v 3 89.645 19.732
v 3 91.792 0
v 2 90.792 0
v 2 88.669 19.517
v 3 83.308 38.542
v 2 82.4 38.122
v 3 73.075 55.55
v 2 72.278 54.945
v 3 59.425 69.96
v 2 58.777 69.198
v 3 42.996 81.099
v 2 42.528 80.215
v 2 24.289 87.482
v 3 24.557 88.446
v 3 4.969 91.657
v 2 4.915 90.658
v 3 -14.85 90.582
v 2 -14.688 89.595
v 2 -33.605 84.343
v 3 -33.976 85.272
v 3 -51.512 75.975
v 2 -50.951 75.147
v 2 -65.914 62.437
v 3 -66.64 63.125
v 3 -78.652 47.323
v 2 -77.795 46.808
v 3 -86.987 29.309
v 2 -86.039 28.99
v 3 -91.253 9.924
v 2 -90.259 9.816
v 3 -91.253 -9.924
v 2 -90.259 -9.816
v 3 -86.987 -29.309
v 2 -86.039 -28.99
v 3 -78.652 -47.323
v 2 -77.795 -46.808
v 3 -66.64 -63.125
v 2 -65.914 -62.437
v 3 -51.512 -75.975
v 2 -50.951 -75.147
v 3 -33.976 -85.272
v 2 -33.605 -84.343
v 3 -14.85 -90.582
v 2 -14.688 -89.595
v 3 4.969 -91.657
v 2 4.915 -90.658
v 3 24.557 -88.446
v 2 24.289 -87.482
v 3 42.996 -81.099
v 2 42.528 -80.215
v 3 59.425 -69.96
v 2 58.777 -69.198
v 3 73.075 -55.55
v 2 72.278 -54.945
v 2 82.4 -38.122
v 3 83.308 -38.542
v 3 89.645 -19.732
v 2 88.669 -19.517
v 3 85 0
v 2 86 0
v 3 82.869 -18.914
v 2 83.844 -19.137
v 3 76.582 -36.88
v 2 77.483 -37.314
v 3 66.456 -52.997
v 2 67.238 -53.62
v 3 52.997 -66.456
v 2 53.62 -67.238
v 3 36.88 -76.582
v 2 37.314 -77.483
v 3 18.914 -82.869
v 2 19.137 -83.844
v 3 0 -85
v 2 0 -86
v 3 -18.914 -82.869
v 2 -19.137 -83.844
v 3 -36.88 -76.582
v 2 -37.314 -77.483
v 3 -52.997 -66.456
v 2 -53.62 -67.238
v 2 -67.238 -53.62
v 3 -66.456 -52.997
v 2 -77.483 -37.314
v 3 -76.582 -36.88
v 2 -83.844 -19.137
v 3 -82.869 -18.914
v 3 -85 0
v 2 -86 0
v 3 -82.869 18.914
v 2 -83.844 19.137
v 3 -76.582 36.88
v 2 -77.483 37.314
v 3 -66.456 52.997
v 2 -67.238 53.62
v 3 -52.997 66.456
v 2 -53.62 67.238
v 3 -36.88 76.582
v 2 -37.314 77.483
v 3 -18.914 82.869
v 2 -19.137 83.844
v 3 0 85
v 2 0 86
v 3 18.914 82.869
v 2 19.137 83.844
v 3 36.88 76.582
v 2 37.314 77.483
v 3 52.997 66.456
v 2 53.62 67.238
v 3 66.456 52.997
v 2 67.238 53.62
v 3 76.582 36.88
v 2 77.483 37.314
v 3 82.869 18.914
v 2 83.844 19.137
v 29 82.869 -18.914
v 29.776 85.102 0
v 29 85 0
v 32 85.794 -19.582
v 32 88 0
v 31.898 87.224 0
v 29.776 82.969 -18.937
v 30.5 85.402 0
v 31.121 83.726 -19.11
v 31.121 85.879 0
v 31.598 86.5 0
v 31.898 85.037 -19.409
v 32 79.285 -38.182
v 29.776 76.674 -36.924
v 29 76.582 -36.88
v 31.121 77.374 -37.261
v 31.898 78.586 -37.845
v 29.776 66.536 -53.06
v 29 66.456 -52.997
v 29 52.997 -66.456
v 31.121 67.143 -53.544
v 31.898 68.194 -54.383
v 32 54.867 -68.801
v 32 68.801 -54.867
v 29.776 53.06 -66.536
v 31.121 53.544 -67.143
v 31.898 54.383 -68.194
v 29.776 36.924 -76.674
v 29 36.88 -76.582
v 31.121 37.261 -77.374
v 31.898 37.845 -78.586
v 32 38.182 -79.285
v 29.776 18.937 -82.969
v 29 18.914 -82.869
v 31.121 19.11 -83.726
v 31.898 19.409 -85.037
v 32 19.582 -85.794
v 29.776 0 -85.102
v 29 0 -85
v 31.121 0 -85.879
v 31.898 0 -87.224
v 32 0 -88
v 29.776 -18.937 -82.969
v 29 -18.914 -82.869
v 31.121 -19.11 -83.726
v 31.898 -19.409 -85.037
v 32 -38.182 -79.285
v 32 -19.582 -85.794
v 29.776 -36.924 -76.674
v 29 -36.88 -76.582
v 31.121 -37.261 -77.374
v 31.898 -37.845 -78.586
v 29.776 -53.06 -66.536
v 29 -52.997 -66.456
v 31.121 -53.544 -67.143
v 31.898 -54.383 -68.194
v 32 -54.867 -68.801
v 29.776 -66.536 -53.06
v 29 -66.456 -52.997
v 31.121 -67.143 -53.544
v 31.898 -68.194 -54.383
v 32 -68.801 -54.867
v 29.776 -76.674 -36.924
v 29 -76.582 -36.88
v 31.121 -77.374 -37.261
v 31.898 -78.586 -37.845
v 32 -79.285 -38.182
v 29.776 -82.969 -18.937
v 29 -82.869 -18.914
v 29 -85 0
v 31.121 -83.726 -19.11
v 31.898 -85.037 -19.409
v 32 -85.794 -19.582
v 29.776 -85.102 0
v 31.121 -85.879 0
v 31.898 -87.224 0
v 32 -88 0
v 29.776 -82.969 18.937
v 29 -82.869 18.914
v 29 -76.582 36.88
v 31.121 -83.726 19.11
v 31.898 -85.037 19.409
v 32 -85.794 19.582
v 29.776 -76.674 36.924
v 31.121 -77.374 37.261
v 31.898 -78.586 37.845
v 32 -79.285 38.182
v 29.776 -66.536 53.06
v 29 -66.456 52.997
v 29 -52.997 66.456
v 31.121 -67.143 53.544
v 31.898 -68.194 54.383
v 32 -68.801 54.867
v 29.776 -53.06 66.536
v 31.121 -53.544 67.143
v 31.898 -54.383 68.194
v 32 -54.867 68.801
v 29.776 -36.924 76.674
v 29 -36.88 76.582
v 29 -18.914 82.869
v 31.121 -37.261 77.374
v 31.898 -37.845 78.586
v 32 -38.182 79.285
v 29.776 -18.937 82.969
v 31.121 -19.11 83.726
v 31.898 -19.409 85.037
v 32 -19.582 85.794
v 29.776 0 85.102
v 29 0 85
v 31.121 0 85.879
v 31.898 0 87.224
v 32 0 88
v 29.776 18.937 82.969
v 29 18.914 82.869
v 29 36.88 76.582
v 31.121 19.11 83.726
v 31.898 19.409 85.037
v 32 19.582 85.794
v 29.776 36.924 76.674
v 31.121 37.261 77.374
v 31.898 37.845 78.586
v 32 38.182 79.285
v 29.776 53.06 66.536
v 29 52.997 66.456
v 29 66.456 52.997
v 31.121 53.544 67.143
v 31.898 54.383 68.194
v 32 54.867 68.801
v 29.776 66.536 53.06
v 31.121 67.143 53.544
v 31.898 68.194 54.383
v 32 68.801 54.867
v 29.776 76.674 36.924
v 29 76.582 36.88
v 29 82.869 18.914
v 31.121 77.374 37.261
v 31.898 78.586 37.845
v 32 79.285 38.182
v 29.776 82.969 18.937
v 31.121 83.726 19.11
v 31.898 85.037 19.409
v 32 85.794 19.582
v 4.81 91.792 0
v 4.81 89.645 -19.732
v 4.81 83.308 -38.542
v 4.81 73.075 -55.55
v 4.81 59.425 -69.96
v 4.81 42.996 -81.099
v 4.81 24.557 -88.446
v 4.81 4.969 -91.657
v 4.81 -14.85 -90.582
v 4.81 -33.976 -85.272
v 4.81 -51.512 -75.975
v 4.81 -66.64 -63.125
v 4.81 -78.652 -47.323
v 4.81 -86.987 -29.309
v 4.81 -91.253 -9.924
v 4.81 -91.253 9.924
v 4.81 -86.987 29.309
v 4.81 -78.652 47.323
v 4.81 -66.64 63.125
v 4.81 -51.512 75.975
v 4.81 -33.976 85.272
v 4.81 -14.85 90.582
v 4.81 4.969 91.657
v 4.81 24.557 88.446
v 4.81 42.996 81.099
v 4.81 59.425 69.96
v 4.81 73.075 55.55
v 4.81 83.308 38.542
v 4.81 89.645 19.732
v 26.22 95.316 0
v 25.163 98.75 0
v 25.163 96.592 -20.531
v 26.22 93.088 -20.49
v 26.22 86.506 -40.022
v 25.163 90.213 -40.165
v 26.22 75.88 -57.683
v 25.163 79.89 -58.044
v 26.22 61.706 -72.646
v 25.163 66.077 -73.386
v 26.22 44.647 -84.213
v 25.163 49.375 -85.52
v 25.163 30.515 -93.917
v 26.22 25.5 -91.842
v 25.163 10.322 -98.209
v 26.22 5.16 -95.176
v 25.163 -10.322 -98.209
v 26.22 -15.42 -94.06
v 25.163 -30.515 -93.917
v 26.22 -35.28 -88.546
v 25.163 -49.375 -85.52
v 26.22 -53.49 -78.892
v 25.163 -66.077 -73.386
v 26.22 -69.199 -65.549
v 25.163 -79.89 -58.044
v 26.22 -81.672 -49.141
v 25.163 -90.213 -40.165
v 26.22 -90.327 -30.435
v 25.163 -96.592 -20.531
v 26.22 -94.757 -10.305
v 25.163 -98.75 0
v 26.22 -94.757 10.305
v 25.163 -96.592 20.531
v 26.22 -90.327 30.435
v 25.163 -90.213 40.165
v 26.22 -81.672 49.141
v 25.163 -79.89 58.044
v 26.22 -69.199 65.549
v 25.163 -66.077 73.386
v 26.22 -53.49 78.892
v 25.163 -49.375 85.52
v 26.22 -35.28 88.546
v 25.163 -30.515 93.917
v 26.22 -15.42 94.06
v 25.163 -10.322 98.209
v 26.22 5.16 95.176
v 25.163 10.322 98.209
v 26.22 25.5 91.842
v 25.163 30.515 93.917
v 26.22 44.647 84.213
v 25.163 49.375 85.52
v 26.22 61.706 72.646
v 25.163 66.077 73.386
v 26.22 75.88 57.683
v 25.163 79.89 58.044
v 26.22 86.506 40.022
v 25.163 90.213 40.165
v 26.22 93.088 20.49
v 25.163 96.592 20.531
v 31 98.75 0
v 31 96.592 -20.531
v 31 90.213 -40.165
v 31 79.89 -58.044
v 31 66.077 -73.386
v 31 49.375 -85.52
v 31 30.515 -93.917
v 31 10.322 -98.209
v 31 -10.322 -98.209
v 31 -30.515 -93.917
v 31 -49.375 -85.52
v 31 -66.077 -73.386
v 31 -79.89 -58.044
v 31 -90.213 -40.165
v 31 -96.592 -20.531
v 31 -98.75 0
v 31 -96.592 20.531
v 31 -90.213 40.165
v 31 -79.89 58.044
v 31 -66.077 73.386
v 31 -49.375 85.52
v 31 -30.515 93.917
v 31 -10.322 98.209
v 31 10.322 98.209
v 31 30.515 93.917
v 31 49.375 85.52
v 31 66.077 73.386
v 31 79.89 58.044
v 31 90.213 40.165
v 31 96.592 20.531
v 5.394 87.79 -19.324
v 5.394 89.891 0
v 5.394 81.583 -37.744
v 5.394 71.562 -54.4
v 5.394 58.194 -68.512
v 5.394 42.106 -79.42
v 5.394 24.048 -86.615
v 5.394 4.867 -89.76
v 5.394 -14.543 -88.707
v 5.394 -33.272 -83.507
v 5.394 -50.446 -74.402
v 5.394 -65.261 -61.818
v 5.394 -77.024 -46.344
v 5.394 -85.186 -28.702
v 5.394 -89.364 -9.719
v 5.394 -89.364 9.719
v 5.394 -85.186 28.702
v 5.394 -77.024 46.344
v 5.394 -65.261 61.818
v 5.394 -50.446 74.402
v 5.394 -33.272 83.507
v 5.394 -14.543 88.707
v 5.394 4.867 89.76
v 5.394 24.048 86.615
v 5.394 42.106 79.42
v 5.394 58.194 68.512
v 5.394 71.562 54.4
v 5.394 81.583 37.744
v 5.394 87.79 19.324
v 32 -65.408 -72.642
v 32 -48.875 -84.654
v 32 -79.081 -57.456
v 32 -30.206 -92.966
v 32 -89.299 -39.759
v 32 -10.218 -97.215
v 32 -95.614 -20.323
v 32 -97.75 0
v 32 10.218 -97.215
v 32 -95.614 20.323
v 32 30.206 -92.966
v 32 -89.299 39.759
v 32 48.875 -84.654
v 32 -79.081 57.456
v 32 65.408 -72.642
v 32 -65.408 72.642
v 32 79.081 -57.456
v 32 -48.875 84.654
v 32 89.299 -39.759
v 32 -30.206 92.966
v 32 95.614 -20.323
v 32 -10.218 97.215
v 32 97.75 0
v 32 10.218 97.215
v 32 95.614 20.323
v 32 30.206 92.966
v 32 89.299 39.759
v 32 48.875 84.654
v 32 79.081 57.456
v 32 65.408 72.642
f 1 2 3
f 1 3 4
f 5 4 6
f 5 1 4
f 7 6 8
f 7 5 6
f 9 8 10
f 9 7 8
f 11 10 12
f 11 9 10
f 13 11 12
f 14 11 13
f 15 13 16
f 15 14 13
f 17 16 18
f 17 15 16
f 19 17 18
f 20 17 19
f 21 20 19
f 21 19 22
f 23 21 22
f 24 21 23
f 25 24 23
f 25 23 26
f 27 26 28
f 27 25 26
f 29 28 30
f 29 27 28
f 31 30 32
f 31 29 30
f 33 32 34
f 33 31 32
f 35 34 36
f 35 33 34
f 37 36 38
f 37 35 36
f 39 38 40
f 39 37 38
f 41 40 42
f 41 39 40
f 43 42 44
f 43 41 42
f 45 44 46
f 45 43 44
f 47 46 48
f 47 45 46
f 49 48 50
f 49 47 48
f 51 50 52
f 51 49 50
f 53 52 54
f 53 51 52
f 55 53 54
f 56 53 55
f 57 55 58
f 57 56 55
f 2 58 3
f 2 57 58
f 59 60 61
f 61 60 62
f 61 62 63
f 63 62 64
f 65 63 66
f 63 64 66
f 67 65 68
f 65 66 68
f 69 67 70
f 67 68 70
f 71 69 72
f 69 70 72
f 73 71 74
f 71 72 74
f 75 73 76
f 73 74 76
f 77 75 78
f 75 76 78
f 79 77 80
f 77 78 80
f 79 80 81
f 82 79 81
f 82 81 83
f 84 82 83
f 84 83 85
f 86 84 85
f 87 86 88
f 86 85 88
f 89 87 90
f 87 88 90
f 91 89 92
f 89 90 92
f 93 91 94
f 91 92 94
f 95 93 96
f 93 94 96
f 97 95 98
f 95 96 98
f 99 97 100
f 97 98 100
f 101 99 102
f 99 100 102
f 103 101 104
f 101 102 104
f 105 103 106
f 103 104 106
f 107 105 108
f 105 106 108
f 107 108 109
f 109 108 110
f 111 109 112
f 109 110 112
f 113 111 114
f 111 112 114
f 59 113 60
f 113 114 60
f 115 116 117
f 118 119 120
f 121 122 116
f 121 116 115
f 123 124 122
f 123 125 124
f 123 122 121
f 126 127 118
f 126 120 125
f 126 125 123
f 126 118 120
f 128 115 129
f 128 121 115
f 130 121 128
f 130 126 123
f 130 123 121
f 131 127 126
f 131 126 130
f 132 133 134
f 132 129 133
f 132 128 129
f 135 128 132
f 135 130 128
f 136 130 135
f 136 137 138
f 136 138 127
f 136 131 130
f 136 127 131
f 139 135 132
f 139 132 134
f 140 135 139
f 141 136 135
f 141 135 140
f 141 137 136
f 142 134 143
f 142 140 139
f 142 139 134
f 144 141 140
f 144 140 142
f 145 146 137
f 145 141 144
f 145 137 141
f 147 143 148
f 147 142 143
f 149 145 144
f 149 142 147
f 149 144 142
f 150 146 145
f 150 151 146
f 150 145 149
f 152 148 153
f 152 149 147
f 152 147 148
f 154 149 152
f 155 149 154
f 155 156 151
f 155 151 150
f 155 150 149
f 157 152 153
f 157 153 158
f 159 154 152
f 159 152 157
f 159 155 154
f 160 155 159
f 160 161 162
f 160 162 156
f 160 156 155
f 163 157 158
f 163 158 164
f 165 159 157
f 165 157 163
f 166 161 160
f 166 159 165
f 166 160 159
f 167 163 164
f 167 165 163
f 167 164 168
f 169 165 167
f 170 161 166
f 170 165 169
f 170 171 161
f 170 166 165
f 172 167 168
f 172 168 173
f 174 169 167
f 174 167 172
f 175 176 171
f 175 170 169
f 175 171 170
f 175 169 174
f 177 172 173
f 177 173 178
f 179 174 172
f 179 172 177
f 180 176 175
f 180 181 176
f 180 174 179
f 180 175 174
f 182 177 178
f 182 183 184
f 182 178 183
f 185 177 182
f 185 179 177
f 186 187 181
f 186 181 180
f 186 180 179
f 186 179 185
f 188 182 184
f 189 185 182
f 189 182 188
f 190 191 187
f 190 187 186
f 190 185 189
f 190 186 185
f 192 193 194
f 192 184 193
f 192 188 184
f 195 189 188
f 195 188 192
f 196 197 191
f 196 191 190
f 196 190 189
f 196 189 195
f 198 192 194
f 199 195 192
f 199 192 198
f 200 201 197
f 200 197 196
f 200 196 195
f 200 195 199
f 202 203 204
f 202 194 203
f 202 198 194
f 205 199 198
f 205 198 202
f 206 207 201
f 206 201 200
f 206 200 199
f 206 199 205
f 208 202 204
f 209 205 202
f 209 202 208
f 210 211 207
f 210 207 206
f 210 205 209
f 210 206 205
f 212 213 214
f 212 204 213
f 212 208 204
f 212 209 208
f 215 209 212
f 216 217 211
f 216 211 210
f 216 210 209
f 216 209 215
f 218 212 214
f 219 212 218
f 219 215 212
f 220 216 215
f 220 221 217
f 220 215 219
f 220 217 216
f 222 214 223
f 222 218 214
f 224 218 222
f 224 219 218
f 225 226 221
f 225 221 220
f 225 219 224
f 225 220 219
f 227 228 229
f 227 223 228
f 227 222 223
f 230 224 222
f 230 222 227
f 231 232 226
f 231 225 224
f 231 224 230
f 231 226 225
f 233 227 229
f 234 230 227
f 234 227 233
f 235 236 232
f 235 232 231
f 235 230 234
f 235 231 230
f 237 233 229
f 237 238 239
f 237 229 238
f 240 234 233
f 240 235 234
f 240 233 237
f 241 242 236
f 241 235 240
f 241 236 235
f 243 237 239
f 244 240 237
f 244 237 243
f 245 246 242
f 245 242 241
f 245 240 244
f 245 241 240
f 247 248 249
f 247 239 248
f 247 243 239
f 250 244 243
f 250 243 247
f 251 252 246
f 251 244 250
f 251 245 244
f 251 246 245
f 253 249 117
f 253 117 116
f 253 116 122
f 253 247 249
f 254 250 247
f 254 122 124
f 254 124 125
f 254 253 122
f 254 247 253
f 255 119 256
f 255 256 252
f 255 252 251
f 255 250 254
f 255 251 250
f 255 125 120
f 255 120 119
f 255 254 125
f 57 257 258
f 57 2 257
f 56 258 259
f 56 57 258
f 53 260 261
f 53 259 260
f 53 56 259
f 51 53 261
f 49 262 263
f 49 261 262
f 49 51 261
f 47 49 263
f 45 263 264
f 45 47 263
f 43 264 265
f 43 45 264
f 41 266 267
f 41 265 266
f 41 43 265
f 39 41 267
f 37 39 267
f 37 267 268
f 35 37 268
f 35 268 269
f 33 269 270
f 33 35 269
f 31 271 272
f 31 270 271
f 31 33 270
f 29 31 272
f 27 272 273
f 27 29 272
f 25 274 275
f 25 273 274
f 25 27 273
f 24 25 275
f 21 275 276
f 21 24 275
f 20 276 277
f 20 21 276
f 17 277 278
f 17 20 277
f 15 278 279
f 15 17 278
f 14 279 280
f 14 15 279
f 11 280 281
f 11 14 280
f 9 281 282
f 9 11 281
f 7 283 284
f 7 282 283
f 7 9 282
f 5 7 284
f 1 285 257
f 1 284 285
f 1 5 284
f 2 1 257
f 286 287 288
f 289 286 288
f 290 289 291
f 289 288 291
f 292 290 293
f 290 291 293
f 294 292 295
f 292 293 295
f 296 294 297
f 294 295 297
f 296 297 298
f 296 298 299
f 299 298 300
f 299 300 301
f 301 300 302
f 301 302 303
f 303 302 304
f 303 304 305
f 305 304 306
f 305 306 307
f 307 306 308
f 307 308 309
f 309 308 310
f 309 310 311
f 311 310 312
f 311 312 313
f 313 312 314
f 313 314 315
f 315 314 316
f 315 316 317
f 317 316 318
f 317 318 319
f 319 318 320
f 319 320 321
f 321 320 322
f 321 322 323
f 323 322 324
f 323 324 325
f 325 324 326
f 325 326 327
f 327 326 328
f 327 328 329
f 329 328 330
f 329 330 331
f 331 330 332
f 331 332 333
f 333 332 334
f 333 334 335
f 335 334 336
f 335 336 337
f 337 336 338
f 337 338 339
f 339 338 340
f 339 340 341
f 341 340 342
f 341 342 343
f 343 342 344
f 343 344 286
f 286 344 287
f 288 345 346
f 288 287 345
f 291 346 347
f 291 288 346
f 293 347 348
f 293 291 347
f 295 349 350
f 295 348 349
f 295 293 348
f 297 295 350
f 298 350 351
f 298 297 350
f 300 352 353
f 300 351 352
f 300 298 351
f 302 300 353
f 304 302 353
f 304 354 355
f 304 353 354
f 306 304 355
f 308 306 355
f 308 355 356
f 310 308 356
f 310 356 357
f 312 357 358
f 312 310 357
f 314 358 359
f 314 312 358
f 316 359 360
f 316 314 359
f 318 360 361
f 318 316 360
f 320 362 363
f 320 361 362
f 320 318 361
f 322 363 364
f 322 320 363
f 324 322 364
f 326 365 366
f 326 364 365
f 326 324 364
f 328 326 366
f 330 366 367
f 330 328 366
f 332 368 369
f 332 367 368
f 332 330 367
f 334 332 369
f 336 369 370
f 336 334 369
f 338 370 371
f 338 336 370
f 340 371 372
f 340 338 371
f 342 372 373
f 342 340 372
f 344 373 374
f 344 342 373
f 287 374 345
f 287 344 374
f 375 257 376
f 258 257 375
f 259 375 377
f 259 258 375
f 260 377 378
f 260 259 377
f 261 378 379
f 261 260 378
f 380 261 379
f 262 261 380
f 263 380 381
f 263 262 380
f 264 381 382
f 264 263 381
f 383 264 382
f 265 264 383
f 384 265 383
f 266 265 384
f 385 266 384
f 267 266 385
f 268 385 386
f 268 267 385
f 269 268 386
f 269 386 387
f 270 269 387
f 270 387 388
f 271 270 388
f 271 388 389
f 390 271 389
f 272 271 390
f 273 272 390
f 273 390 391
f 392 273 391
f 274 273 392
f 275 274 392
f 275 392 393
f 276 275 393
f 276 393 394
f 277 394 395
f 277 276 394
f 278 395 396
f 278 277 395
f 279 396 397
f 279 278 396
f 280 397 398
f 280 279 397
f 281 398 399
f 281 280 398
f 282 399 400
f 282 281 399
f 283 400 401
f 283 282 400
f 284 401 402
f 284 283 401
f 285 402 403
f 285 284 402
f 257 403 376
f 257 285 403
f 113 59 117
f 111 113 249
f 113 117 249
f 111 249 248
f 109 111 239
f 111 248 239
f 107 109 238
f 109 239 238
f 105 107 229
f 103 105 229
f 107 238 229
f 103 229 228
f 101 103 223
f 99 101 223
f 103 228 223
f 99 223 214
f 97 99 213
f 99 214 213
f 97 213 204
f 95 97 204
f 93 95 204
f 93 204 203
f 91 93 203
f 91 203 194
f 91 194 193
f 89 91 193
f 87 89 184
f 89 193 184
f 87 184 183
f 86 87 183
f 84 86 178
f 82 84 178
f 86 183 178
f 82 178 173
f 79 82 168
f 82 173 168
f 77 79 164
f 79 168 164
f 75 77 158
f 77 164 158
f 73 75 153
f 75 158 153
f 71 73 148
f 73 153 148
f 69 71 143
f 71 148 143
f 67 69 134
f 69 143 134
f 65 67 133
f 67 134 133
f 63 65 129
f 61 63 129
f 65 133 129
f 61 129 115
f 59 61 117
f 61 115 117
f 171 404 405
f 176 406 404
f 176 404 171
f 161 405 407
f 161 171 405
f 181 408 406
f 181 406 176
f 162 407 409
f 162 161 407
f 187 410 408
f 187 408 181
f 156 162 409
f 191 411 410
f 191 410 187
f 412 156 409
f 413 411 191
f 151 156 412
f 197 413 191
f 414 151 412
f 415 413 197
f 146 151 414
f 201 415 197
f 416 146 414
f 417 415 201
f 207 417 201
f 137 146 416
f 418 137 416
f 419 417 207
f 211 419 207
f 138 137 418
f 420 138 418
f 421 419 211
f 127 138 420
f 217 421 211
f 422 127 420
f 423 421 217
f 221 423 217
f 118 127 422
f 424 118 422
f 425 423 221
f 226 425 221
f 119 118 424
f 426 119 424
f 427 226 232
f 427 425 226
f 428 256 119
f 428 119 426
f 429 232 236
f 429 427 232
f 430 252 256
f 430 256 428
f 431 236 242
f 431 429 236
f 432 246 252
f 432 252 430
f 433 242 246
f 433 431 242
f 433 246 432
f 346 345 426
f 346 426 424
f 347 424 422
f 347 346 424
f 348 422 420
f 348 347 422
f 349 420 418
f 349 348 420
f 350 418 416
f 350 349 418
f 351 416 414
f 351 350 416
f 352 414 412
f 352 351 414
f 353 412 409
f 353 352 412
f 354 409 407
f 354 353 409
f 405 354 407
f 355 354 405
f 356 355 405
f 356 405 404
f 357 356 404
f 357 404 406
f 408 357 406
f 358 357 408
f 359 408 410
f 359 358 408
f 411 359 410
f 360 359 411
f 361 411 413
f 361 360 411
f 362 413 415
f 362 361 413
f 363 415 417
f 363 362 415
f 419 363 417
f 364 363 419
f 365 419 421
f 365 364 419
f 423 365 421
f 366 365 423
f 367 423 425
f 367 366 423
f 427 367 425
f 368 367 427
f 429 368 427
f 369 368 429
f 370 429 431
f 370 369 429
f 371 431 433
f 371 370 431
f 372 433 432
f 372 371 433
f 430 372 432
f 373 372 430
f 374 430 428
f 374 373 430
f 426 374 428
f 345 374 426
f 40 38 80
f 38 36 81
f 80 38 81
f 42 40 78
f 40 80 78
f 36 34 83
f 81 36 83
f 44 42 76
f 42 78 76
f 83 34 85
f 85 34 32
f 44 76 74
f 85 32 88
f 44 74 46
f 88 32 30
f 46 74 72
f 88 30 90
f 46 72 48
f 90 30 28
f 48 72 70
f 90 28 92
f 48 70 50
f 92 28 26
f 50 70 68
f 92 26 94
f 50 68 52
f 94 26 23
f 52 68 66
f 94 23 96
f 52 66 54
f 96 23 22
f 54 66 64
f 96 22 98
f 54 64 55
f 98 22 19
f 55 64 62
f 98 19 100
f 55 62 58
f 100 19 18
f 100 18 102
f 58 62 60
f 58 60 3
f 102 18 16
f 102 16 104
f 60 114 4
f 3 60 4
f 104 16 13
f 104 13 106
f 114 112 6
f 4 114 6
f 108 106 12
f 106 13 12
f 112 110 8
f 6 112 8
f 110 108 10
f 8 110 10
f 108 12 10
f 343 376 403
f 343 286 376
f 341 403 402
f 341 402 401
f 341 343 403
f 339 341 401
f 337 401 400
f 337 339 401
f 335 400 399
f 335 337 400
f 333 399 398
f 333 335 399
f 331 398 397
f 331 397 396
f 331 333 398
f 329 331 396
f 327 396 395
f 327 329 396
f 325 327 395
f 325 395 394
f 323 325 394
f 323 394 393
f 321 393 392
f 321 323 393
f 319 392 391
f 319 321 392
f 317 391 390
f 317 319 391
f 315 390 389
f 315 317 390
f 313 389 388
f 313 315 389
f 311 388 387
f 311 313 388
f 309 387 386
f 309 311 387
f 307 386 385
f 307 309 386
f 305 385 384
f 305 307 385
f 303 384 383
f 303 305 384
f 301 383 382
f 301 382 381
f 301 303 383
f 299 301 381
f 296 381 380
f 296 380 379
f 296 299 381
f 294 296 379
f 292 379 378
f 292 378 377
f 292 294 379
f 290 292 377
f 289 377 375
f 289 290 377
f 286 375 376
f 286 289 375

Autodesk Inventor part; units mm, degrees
sketch "Sketch_1" plane through (0, 0, 0) normal (0, 0, 1) x (1, 0, 0)
  line L0 (32, 0) -> (-32, 0)
  line L1 (2, 86) -> (3, 85)
  line L2 (3, 85) -> (29, 85)
  arc A0 (29, 85) -> (32, 88) centre (29, 88) ccw
  line L3 (32, 88) -> (32, 97.75)
  line L4 (32, 97.75) -> (31, 98.75)
  line L5 (31, 98.75) -> (25.1631, 98.75)
  line L6 (25.1631, 98.75) -> (26.2196, 95.316)
  line L7 (26.2196, 95.316) -> (5.394, 89.8914)
  line L8 (5.394, 89.8914) -> (4.8095, 91.7915)
  line L9 (4.8095, 91.7915) -> (3, 91.7915)
  line L10 (3, 91.7915) -> (2, 90.7915)
  line L11 (2, 90.7915) -> (2, 86)
revolve "Revolution1" add sketch "Sketch_1" angle 360 about axis through (32, 0, 0) along (1, 0, 0)
ref_plane "inner_ring_XY" through (0, 0, 0) normal (0, 0, 1) x (1, 0, 0)
ref_plane "inner_ring_YZ" through (0, 0, 0) normal (1, 0, 0) x (0, 1, 0)
ref_plane "inner_ring_ZX" through (0, 0, 0) normal (0, 1, 0) x (0, 0, 1)
properties part number "T4DB 170_ir"
